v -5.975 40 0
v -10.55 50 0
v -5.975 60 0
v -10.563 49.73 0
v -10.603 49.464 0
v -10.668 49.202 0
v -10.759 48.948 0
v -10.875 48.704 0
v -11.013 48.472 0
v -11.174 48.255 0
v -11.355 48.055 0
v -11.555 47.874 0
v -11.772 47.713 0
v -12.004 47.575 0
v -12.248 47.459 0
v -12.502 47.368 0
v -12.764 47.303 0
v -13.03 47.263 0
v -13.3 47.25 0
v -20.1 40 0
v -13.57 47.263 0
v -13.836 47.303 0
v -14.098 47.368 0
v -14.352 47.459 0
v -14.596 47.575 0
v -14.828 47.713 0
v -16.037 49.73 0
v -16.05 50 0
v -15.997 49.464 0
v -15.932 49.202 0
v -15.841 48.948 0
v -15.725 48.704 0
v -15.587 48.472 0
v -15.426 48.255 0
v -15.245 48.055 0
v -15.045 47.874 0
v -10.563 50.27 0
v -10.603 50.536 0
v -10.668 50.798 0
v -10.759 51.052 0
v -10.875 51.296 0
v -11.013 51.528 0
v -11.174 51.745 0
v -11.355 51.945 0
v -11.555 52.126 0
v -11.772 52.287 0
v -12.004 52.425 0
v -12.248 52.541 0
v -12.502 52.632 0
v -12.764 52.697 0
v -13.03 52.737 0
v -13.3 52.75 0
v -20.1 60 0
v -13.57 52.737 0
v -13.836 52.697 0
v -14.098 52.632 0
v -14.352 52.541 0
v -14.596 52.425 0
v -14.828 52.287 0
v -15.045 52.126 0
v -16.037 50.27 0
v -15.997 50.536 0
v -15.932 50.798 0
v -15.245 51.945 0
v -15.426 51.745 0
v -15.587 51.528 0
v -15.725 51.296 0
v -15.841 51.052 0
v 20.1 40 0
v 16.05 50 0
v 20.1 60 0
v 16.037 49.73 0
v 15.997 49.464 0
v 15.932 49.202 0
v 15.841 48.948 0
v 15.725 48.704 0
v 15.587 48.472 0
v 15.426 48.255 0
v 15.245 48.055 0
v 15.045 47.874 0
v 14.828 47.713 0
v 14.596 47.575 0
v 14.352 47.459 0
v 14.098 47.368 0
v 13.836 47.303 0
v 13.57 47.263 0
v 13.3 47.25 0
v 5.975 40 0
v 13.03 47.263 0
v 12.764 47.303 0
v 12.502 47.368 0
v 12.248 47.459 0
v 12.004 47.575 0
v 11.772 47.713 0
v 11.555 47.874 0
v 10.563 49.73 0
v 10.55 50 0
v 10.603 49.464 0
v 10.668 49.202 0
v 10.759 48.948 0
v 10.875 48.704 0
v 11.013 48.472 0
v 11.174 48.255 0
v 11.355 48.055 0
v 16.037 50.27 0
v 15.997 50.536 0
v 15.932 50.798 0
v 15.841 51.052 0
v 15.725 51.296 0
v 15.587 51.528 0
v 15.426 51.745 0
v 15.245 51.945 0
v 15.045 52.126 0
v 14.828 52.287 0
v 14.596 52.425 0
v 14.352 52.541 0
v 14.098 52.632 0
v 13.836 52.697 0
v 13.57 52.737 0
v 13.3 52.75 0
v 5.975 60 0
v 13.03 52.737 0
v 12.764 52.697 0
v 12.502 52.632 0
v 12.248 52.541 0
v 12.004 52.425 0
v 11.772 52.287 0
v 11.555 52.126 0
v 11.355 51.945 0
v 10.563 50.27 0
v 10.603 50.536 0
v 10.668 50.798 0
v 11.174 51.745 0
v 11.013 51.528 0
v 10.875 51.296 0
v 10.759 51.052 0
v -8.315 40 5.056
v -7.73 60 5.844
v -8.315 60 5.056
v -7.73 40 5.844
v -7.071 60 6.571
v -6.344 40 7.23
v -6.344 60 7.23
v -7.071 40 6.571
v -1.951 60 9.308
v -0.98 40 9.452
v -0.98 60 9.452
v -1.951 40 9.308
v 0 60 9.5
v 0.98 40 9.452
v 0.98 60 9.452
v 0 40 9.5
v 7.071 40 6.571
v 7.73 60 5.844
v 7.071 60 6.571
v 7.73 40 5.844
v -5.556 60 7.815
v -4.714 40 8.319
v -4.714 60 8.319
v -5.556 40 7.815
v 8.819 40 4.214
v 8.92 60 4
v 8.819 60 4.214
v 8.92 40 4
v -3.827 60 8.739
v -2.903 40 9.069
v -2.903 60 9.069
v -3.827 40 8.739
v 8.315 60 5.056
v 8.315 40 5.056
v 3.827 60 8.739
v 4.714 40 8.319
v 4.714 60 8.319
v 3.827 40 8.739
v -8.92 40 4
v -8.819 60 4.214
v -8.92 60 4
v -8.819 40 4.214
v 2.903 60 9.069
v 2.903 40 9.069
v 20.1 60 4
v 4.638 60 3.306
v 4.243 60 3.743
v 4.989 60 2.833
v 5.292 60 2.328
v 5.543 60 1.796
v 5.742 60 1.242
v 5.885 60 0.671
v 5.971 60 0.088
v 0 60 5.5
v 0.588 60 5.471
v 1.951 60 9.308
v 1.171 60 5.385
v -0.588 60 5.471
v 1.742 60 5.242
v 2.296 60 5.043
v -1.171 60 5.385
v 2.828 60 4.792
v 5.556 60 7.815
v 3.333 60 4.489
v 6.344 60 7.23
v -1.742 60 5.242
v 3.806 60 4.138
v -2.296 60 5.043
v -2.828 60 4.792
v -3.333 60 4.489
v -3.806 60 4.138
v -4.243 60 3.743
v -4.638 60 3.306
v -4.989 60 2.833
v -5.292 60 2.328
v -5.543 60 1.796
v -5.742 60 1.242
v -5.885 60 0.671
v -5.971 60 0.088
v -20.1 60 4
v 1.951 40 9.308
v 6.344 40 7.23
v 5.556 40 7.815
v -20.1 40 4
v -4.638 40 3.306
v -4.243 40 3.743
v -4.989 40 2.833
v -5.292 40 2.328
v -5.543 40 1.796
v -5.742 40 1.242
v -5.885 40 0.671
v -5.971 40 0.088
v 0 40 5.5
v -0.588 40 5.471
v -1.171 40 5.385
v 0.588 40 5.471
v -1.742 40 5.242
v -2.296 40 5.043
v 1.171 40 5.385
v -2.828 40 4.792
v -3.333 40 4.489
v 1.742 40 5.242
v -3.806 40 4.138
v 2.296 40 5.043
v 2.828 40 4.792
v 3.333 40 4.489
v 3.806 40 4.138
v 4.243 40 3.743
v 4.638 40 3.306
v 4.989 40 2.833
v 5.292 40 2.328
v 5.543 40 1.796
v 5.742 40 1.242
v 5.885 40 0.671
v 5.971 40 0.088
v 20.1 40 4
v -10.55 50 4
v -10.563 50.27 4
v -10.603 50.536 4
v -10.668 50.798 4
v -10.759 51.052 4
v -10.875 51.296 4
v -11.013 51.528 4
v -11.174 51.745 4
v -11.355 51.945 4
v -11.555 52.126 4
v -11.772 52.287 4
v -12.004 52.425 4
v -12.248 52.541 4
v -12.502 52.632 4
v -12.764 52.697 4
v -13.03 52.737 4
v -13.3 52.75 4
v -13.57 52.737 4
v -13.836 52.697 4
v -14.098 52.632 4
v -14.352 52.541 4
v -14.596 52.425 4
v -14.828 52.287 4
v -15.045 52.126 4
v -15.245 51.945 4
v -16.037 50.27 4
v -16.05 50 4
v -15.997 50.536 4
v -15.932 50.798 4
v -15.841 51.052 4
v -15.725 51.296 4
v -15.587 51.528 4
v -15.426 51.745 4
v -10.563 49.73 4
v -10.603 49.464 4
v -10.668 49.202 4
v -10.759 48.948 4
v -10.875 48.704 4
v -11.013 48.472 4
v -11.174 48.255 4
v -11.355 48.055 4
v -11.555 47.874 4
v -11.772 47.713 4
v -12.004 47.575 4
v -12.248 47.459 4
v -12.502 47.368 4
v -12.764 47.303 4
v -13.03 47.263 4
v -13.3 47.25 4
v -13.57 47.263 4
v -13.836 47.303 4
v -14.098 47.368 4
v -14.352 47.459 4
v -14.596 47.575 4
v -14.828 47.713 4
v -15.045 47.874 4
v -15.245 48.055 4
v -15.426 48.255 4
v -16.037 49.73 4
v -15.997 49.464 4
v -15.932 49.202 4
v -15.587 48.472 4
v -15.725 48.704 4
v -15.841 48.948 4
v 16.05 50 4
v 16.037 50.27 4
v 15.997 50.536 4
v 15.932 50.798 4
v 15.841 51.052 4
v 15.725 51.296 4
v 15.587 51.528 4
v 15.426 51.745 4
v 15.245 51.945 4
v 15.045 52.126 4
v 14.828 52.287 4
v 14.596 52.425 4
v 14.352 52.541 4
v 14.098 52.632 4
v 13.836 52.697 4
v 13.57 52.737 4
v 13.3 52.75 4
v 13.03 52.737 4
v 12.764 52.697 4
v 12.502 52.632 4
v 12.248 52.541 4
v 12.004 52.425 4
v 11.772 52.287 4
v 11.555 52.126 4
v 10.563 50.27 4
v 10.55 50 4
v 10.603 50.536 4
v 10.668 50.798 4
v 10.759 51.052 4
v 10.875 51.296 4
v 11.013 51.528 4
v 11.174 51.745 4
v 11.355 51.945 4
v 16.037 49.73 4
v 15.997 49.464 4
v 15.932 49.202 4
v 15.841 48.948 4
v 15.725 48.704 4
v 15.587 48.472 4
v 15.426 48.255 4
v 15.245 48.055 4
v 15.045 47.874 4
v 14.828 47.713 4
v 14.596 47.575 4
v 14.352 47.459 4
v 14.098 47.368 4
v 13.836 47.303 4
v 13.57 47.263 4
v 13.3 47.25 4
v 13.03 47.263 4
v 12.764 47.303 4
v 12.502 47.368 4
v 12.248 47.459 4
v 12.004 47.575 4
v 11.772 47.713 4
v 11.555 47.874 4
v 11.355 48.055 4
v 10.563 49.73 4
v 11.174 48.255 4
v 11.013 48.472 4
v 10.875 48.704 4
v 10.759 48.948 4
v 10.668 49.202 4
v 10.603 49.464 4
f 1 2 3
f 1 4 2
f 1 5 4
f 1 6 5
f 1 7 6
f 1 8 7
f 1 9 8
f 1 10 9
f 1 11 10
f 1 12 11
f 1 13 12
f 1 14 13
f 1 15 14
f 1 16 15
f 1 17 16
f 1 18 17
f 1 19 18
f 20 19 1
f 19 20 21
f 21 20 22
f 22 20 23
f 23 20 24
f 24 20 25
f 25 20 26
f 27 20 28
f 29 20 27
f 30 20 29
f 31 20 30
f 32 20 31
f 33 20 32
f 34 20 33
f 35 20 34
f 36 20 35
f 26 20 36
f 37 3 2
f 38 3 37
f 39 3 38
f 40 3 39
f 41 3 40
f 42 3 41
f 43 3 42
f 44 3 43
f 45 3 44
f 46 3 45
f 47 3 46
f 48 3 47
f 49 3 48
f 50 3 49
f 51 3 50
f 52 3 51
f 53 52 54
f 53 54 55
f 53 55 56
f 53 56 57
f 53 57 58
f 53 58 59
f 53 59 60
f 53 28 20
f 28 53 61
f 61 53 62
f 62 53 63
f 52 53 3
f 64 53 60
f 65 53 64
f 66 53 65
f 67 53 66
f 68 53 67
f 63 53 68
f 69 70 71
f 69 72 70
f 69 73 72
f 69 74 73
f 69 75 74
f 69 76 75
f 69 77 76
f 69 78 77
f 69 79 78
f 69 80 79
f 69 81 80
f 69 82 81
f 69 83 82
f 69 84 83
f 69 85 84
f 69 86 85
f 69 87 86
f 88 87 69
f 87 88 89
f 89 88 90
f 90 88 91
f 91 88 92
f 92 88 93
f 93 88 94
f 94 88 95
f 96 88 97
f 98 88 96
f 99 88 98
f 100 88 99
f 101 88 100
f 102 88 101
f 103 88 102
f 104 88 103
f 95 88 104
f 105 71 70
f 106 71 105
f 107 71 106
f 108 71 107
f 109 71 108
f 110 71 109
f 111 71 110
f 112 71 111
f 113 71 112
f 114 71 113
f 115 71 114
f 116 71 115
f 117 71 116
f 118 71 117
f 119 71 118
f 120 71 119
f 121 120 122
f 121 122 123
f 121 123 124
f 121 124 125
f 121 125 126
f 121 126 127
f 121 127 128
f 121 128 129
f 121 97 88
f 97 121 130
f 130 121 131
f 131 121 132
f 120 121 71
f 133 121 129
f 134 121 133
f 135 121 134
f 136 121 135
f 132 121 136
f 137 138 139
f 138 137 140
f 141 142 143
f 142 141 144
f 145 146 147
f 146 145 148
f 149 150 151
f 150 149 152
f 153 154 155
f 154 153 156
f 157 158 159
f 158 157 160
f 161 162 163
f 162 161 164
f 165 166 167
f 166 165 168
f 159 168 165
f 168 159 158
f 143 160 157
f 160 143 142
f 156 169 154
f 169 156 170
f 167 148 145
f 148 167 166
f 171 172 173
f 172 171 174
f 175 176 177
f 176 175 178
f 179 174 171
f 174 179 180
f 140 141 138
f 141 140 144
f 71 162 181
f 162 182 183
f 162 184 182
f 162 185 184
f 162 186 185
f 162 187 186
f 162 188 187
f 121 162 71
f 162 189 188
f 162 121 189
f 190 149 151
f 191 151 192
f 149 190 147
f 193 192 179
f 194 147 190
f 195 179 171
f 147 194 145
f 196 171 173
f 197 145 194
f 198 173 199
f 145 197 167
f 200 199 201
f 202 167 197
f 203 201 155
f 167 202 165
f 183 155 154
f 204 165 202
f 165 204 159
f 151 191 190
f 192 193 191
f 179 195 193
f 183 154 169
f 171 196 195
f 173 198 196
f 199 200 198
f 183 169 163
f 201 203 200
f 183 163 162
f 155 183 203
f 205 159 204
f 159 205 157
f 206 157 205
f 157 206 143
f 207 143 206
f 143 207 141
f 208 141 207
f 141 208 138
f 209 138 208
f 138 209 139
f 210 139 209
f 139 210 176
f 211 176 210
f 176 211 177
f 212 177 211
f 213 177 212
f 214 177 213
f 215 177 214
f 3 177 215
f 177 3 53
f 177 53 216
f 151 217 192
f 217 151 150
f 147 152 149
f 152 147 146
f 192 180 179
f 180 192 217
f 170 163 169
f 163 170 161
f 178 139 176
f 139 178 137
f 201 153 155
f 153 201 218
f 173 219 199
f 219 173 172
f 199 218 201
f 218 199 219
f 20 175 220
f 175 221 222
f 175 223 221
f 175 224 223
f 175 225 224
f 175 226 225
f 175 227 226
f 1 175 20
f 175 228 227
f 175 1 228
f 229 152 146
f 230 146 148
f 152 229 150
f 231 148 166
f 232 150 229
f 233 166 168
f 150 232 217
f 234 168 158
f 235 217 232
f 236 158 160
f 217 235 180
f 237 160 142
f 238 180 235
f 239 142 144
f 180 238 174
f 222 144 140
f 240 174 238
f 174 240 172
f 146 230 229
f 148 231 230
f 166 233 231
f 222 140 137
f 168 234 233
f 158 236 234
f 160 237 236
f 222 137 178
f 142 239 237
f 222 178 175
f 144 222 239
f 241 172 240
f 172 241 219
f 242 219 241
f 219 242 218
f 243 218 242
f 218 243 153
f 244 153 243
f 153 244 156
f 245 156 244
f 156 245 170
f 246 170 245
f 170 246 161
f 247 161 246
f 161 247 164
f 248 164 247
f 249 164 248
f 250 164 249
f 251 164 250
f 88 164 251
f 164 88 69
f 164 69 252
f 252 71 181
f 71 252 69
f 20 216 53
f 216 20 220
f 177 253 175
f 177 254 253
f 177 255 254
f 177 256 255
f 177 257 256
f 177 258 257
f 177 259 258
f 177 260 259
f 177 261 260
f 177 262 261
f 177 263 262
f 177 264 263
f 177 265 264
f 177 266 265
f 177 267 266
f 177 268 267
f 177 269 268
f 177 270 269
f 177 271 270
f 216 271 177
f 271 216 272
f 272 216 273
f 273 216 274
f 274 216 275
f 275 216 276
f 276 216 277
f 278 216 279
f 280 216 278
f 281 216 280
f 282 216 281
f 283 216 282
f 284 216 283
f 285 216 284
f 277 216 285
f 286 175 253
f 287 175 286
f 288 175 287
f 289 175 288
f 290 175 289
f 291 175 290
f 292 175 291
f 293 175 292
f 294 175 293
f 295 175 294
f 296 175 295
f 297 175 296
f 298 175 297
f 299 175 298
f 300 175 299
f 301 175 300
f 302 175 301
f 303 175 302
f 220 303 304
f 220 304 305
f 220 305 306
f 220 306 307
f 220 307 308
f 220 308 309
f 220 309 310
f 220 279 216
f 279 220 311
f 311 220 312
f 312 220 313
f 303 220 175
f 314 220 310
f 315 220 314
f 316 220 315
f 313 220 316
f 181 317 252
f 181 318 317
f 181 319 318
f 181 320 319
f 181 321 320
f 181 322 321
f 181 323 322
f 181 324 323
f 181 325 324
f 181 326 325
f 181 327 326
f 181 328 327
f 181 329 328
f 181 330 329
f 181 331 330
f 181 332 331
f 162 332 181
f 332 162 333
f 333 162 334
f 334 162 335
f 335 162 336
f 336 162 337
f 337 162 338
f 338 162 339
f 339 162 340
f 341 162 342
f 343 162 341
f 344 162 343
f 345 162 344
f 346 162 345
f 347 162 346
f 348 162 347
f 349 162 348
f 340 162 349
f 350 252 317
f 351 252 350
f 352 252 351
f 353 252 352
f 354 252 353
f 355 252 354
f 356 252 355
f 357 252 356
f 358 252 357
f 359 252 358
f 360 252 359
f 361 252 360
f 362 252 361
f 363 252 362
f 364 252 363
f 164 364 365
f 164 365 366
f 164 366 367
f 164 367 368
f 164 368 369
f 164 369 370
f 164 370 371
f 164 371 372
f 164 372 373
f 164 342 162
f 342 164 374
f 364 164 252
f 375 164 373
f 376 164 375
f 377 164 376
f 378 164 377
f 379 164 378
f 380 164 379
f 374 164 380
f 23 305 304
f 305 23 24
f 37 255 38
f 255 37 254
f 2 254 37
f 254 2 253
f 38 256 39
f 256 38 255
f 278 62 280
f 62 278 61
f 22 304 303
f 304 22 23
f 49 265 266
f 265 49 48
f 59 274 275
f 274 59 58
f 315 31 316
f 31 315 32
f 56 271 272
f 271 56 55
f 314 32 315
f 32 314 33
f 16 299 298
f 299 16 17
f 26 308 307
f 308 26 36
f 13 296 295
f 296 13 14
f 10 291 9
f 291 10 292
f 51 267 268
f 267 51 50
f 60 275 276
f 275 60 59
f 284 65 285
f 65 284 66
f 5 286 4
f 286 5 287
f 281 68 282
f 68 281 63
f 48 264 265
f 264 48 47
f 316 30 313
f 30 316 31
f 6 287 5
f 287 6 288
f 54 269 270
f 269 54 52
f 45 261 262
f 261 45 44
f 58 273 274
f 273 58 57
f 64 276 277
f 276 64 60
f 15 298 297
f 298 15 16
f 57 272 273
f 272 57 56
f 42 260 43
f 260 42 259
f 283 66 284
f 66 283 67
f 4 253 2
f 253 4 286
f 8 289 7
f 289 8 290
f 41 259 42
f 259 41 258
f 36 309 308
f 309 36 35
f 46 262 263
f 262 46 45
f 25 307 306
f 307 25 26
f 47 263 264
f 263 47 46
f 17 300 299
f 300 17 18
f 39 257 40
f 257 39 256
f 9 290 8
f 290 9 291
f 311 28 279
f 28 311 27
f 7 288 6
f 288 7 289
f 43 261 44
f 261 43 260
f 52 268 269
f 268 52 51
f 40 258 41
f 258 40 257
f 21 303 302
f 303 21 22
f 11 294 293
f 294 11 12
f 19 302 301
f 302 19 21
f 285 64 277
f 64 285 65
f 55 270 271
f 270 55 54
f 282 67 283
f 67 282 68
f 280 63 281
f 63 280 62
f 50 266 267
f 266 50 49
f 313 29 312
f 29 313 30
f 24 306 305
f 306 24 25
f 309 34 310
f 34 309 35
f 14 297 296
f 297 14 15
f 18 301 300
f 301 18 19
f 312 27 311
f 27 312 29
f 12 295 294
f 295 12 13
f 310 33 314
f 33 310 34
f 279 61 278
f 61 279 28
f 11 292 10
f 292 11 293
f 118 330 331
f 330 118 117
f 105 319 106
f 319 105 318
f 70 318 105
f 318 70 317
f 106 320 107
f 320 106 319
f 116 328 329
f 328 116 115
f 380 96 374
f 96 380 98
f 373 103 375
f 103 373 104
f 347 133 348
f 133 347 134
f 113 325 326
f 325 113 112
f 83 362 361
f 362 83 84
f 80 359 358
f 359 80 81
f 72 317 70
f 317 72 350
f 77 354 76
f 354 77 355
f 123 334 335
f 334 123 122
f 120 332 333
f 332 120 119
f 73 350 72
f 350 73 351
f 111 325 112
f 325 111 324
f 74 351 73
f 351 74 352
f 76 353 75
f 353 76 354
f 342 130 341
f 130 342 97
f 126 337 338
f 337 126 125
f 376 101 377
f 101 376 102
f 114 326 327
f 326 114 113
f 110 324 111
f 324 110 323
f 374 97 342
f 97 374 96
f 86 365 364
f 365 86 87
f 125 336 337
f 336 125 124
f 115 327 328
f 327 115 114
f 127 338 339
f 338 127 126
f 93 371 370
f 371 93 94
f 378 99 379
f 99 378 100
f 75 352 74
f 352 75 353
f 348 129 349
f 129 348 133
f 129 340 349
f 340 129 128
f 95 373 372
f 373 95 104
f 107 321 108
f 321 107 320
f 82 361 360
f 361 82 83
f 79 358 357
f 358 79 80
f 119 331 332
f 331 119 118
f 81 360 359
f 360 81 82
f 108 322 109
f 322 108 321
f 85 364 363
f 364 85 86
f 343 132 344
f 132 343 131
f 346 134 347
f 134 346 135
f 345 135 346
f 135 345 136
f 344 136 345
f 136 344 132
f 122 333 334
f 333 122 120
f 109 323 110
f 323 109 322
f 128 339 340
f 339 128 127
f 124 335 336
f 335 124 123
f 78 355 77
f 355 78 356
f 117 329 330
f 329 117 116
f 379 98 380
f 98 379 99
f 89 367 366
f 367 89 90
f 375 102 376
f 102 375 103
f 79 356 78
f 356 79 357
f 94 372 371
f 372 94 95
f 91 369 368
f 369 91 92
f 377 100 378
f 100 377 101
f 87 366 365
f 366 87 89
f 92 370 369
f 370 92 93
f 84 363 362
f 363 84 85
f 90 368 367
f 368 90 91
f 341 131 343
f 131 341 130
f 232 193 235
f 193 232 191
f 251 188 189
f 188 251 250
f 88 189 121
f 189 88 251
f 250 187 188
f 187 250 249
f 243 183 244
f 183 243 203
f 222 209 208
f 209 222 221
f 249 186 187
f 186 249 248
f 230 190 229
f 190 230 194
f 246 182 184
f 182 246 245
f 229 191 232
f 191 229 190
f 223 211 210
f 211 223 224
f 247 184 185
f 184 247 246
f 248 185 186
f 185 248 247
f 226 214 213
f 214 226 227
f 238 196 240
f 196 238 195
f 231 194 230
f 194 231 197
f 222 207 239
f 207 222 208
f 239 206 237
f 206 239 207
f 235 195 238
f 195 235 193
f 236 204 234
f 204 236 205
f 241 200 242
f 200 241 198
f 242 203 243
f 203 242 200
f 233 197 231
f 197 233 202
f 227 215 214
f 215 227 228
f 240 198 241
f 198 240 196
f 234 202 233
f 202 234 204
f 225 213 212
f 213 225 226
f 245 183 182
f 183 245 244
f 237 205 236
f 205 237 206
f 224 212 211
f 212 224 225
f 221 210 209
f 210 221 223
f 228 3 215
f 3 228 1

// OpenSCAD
// Removable half of the gooseneck tube clamp. Print 1.
// Print orientation: flange on the bed.
include <params.scad>
include <lib.scad>

rotate([90, 0, 0]) translate([0, -clamp_gap / 2, 0]) speaker_clamp_cap();
